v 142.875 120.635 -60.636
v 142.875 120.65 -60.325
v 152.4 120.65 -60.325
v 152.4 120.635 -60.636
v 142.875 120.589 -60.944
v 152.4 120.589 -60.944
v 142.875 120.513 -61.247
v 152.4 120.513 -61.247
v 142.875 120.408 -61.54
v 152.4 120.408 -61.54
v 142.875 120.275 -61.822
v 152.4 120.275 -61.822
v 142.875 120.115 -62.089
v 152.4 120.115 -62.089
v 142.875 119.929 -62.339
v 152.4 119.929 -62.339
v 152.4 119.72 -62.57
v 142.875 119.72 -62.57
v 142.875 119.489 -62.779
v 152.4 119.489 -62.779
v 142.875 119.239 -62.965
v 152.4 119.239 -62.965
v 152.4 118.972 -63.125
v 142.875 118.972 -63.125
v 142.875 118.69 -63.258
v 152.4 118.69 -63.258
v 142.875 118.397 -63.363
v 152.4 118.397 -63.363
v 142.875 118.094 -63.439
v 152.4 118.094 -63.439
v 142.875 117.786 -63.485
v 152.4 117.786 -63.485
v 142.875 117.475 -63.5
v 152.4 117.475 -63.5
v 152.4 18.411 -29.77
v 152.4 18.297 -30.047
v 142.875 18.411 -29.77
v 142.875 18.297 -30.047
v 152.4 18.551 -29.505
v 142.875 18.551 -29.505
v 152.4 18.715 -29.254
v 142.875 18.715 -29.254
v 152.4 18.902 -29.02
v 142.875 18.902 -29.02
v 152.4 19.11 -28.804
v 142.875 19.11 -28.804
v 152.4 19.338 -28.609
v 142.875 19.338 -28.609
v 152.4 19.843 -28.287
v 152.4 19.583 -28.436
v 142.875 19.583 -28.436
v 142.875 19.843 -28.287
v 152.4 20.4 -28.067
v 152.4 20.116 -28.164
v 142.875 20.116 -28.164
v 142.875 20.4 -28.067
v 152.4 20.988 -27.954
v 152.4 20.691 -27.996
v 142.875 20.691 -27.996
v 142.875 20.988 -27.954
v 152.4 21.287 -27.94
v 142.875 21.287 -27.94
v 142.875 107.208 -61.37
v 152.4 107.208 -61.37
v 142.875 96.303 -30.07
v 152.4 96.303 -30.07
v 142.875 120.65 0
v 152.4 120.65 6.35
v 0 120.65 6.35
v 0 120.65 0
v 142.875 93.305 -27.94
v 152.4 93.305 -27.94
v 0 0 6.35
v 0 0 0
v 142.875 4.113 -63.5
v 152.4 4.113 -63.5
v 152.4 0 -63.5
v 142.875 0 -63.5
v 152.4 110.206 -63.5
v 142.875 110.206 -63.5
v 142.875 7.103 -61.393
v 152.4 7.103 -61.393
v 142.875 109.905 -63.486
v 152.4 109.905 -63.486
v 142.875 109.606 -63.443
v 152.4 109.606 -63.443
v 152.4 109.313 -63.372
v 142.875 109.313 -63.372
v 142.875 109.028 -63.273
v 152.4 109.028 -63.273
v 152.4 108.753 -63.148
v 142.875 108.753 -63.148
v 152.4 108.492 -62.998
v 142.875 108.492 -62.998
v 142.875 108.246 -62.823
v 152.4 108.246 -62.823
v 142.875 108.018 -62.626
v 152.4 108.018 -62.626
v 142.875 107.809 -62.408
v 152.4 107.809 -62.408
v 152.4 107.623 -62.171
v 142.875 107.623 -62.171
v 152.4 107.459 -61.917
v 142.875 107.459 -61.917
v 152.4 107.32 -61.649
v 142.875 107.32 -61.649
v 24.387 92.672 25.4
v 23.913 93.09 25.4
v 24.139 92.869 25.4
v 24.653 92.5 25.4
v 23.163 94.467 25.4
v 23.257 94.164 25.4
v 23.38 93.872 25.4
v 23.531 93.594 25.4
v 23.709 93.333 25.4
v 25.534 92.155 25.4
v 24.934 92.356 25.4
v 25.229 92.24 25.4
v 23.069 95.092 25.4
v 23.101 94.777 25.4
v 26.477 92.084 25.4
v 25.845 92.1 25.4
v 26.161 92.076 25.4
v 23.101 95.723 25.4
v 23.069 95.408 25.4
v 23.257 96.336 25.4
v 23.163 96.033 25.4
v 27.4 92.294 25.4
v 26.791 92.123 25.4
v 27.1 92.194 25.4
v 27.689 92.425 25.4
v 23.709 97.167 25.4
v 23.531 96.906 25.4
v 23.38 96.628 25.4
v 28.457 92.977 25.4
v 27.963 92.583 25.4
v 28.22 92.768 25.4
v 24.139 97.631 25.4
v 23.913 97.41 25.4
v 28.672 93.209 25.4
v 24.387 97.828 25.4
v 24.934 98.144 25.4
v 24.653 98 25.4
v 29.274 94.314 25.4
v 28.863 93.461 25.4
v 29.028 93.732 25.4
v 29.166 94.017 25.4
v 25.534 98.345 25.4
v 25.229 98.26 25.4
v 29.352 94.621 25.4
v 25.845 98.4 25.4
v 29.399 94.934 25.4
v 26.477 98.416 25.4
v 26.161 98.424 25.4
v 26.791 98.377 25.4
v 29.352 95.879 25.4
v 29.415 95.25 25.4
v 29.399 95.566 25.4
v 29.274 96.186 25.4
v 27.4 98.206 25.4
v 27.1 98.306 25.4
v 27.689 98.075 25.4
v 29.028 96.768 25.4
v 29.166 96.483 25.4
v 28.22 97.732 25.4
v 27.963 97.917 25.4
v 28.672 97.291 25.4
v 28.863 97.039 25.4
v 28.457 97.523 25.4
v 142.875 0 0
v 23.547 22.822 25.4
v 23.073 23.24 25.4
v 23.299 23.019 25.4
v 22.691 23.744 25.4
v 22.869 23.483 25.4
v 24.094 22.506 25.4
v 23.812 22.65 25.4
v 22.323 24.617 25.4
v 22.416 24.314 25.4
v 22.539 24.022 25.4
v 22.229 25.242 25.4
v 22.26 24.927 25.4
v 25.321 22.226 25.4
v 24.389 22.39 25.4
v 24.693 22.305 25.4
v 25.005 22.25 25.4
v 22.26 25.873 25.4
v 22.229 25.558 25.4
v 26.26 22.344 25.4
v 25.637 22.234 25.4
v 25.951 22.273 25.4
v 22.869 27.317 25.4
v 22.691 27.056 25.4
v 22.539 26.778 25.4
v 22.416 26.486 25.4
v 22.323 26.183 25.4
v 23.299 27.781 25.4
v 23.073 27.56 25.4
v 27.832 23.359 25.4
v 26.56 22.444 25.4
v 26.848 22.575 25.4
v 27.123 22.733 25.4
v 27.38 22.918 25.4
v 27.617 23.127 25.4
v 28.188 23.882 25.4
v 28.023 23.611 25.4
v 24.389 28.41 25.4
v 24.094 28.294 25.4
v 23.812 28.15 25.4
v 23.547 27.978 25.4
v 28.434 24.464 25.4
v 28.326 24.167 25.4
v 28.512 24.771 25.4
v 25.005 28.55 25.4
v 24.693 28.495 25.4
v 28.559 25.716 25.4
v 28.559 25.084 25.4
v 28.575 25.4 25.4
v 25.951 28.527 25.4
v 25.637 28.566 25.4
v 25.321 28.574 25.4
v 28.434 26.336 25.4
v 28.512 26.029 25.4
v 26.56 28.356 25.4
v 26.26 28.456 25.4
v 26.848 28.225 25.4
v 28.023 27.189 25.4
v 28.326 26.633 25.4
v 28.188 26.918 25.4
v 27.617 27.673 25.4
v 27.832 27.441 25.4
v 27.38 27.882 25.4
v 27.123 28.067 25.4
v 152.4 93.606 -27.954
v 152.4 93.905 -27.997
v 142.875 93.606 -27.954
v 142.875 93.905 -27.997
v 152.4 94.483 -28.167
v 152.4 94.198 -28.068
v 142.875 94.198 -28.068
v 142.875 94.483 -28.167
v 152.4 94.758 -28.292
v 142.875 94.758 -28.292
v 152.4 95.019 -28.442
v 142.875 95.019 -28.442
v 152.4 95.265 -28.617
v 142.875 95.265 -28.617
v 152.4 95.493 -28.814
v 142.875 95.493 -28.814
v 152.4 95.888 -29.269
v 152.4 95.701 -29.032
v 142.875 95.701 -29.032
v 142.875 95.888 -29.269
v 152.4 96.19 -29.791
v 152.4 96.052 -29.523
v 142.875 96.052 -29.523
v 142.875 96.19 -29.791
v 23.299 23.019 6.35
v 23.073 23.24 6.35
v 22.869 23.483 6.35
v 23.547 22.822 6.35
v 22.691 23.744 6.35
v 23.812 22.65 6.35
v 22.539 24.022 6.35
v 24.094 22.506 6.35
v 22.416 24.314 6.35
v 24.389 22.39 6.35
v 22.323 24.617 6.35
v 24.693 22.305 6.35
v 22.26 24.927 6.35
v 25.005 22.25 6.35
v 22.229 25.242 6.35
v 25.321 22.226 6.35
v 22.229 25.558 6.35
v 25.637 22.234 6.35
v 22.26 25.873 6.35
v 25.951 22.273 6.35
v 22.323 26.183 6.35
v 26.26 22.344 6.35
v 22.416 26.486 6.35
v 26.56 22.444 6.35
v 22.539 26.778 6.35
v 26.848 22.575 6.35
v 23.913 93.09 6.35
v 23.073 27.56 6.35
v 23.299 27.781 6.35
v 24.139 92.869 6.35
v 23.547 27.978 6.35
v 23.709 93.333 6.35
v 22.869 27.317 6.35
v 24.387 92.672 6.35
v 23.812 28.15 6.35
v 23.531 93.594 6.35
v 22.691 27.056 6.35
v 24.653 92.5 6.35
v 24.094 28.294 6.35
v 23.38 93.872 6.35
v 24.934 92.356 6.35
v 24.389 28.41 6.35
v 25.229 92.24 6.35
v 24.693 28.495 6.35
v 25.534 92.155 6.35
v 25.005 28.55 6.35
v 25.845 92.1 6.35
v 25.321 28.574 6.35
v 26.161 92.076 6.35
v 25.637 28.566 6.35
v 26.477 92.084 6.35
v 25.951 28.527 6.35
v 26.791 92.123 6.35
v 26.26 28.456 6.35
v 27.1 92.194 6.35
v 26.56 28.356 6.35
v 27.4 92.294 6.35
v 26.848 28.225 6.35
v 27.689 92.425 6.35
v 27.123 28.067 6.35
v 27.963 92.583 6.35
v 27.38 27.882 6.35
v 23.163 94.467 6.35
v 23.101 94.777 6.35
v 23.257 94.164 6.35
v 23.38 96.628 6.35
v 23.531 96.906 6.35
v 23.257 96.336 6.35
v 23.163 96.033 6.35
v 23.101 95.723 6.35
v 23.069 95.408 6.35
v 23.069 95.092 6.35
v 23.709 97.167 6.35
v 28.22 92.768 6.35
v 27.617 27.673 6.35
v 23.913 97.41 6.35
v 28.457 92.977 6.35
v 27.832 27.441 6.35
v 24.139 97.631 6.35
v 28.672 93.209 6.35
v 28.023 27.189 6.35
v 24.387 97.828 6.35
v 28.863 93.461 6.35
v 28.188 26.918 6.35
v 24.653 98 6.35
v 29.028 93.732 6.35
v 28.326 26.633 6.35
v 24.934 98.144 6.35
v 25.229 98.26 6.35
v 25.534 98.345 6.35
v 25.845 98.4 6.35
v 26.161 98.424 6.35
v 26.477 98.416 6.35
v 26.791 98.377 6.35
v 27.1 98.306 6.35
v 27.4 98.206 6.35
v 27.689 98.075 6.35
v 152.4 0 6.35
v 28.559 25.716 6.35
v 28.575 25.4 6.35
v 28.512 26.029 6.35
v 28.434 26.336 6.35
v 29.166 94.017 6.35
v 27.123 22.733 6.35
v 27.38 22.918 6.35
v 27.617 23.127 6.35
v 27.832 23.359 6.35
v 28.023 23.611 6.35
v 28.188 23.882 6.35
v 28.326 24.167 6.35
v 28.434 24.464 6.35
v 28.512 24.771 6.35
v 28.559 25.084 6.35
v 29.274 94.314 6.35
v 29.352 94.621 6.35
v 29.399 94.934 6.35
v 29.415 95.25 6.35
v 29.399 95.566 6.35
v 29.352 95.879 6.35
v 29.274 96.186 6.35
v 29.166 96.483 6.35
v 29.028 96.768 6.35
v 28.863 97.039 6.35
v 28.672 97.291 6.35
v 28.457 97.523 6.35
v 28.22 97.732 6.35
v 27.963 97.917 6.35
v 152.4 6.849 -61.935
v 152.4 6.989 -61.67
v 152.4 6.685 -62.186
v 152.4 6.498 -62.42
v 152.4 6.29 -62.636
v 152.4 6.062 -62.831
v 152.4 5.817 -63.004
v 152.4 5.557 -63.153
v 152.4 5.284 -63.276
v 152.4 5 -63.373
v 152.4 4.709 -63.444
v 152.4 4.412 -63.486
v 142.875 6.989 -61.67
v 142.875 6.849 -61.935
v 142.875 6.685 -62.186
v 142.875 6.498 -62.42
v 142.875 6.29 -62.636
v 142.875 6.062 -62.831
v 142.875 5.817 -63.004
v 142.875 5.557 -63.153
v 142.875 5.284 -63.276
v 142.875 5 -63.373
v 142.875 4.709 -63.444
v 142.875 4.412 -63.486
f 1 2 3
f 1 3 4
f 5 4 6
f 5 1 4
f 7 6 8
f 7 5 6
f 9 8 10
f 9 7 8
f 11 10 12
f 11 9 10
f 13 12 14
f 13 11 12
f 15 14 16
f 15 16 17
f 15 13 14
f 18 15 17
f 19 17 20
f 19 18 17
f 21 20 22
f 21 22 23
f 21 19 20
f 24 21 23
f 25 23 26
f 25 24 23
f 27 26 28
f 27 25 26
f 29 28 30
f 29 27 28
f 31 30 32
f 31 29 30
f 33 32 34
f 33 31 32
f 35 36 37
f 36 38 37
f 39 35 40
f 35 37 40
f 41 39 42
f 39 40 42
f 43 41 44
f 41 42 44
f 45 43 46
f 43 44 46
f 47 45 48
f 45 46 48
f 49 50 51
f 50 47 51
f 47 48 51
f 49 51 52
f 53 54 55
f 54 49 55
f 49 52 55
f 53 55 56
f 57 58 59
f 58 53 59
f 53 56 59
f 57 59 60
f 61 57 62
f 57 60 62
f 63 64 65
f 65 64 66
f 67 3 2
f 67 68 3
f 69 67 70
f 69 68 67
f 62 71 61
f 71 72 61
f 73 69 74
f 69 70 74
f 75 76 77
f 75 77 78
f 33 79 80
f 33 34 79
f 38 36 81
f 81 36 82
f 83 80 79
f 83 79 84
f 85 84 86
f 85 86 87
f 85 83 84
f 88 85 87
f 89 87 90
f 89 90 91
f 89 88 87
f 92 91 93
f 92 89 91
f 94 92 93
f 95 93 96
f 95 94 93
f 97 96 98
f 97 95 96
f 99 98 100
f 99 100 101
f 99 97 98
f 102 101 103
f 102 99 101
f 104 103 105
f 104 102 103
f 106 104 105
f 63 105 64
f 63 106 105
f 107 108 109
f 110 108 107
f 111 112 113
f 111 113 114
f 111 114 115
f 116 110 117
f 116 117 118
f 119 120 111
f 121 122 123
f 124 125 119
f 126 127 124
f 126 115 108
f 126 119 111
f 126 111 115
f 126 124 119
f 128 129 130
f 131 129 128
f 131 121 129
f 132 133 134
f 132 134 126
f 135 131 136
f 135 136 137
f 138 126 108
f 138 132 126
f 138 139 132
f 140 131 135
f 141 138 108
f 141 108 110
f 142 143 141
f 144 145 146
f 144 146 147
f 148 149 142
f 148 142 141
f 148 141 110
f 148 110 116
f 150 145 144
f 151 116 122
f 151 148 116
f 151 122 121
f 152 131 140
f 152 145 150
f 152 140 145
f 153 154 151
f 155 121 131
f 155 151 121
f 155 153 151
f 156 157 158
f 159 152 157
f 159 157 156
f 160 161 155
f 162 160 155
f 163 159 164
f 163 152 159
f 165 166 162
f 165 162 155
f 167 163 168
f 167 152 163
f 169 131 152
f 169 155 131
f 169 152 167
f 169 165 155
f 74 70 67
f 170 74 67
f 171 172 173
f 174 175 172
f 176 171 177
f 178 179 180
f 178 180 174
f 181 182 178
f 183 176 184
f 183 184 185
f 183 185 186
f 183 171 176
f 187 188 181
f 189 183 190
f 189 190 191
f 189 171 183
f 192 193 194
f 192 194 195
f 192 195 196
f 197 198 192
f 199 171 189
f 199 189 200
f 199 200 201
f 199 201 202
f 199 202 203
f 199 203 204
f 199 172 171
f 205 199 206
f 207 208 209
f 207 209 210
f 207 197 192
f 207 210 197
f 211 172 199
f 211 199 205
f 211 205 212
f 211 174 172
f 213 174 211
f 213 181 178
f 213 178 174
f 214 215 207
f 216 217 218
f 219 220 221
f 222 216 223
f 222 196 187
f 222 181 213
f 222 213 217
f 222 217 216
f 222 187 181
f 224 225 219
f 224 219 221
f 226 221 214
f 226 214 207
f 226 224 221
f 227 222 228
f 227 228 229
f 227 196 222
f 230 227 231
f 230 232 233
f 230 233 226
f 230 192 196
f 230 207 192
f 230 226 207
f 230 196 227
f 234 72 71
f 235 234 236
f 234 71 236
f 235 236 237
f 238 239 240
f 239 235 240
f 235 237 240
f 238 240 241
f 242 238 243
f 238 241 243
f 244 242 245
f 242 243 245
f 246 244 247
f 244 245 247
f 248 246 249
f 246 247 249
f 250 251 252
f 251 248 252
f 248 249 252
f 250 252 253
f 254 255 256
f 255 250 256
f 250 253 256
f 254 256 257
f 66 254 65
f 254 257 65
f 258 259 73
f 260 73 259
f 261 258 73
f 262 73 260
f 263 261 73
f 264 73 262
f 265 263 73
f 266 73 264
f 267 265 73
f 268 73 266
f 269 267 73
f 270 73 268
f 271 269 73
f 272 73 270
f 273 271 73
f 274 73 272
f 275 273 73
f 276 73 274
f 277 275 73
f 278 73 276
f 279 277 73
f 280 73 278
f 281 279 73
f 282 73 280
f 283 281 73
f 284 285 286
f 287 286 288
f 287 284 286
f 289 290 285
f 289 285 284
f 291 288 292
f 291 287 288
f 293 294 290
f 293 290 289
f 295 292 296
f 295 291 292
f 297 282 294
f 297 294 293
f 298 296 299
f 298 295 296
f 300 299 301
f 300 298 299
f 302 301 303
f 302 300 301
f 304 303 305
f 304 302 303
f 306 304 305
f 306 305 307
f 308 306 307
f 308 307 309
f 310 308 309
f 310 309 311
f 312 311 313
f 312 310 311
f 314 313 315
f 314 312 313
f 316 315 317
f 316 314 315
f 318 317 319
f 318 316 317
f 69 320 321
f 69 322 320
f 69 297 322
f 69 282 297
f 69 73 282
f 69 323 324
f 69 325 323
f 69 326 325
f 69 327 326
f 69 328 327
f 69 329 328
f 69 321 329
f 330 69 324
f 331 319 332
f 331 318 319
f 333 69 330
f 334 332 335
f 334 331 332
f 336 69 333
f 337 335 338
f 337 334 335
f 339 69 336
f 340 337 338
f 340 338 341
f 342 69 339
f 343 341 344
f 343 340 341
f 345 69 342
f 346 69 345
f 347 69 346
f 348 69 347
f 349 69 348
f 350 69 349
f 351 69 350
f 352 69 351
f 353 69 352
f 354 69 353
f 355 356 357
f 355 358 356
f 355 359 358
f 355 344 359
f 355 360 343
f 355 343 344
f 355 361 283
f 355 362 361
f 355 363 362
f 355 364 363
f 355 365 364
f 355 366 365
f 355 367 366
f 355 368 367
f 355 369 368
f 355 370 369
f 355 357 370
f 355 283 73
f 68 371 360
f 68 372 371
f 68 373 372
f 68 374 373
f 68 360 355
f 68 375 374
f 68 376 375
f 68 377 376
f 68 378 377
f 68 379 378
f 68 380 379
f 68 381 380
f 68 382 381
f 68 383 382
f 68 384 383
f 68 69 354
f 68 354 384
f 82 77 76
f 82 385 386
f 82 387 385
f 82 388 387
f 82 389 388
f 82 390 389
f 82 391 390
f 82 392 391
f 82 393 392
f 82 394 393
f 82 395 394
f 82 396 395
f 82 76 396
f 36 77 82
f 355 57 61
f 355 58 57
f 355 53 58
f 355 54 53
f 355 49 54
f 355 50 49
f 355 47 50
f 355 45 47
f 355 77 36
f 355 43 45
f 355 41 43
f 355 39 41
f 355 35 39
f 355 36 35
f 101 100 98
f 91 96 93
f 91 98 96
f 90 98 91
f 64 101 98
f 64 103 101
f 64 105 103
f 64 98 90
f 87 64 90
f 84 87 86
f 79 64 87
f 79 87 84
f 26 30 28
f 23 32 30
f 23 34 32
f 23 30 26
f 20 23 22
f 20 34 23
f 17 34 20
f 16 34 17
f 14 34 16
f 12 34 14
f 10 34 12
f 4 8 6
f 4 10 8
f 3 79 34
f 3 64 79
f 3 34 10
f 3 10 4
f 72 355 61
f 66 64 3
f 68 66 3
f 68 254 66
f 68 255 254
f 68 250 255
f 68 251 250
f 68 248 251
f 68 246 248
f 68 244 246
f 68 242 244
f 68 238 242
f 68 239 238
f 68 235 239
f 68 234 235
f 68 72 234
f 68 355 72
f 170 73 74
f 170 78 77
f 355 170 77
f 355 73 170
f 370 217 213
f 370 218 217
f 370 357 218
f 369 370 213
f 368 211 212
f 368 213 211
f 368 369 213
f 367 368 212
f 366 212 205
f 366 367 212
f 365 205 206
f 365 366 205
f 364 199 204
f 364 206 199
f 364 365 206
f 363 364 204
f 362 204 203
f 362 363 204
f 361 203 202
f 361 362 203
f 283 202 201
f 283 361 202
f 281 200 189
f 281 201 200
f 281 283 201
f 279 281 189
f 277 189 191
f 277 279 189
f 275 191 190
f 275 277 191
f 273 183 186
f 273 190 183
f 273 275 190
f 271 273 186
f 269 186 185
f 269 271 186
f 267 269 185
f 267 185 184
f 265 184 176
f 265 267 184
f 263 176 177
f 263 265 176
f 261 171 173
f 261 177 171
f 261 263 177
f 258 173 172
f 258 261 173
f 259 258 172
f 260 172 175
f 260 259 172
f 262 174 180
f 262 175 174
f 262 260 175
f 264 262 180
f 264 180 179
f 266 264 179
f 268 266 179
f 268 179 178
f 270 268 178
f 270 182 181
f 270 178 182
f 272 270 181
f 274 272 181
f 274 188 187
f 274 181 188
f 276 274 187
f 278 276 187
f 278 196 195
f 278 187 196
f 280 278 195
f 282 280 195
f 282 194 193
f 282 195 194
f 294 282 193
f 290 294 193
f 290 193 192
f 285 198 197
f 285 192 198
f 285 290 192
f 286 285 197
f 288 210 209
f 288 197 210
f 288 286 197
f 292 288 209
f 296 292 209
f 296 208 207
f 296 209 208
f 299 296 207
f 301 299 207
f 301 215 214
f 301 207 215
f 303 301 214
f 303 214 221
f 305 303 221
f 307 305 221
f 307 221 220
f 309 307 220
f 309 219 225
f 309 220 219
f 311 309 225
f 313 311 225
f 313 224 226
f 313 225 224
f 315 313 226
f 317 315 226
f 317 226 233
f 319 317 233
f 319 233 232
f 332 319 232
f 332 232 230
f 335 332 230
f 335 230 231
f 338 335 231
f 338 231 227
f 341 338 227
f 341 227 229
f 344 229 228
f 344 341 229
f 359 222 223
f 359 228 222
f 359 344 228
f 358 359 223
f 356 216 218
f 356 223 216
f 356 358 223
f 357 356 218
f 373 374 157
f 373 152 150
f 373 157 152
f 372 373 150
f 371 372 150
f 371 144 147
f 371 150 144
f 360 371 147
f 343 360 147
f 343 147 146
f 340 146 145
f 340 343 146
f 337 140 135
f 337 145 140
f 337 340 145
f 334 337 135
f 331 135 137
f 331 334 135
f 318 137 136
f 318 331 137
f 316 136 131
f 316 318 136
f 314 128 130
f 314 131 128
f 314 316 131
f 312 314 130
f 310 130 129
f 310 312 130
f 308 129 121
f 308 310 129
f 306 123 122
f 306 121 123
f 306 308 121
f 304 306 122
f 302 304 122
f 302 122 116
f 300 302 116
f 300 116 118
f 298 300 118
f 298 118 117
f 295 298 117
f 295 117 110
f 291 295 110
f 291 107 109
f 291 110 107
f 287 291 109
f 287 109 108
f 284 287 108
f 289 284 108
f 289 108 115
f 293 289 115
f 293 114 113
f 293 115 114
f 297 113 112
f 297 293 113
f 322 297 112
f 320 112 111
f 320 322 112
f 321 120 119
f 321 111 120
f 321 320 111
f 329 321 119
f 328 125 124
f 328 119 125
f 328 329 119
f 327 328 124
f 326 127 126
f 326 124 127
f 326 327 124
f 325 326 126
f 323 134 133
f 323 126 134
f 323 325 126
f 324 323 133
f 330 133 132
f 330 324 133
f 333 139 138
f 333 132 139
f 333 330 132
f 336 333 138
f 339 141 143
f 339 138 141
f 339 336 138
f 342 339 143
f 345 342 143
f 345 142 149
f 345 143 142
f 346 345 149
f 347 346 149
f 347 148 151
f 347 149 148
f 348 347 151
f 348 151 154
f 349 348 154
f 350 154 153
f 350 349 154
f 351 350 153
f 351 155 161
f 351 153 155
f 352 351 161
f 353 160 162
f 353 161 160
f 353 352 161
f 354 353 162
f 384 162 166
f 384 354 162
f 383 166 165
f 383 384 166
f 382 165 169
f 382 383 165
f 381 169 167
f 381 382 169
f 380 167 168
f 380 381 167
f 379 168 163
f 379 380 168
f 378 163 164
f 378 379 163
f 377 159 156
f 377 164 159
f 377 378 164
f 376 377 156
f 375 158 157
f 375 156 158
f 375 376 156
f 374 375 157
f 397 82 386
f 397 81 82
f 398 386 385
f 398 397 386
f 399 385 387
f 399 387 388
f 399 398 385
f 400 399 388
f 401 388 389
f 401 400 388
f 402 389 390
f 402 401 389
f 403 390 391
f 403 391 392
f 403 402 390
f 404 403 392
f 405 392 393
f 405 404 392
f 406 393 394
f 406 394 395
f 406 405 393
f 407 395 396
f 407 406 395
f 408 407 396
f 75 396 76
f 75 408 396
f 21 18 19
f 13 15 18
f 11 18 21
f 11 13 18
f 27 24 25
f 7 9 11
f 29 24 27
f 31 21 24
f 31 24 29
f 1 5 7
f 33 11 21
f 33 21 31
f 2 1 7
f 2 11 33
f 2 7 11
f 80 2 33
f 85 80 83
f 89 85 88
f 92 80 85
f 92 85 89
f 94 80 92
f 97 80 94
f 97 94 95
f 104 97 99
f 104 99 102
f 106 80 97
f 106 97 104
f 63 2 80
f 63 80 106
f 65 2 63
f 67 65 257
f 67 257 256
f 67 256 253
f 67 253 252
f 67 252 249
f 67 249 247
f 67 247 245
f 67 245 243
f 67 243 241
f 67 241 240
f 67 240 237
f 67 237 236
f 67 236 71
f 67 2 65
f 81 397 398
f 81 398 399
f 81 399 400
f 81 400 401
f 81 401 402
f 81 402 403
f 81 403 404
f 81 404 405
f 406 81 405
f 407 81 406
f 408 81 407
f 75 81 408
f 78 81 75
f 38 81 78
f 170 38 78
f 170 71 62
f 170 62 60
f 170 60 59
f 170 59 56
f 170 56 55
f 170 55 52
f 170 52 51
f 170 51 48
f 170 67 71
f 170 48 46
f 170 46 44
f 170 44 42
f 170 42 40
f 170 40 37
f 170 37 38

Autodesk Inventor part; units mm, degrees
ref_plane "YZ Plane" through (0, 0, 0) normal (1, 0, 0) x (0, 1, 0)
ref_plane "XZ Plane" through (0, 0, 0) normal (0, 1, 0) x (-1, 0, 0)
ref_plane "XY Plane" through (0, 0, 0) normal (0, 0, 1) x (1, 0, 0)
sketch "Sketch1" plane through (0, 0, 0) normal (0, 0, 1) x (1, 0, 0)
  line L0 (0, 0) -> (152.4, 0)
  line L1 (152.4, 0) -> (152.4, 120.65)
  line L2 (152.4, 120.65) -> (0, 120.65)
  line L3 (0, 120.65) -> (0, 0)
  dimension "d0" = 152.4
  dimension "d1" = 120.65
extrude "Extrusion1" add sketch "Sketch1" along normal blind 6.35
sketch "Sketch2" plane through (0, 0, 6.35) normal (0, 0, 1) x (1, 0, 0)
  line L0 (0, 0) -> (152.4, 0) projected
  line L1 (152.4, 120.65) -> (0, 120.65) projected
  line L2 (114.2866, 59.261) -> (0, 60.6355)
  line L3 (0, 120.65) -> (0, 0) projected
  line L4 (76.2, 0) -> (76.2, 120.65)
  circle A0 centre (25.4, 25.4) radius 3.175
  circle A1 centre (26.2401, 95.25) radius 3.175
  point P0 (114.7072, 94.0562)
  dimension "d18" = 25.4
  dimension "d20" = 25.4
  dimension "d23" = 25.4
  dimension "d24" = 26.2401
  dimension "d31" = 69.85
  dimension "d32" = 6.35
sketch "Sketch3" plane through (0, 0, 6.35) normal (0, 0, 1) x (1, 0, 0)
  point P0 (0, 0)
extrude "Extrusion4" add sketch "Sketch2" along normal blind 19.05 contours A0 | A1
thread "Thread5" size "3/8-16 UNC" class "2A" standard "ANSI Unified Screw Threads" full length
thread "Thread6" size "3/8-16 UNC" class "2A" standard "ANSI Unified Screw Threads" full length
sketch "Sketch7" plane through (0, 0, 0) normal (0, 0, -1) x (-1, 0, 0)
  line L0 (-152.4, 0) -> (-152.4, 120.65) projected
  line L1 (0, 0) -> (-152.4, 0) projected
  line L2 (-152.4, 120.65) -> (-142.875, 120.65)
  line L3 (-142.875, 120.65) -> (-142.875, 0)
  line L4 (-142.875, 0) -> (-152.4, 0)
  line L5 (-152.4, 0) -> (-152.4, 120.65)
  dimension "d36" = 9.525
extrude "Extrusion6" add sketch "Sketch7" along normal blind 63.5
sketch "Sketch8" plane through (152.4, 0, 6.35) normal (1, 0, 0) x (0, 0, -1)
  line L0 (69.85, 0) -> (69.85, 120.65) projected
  line L1 (0, 0) -> (0, 120.65) projected
  line L2 (69.85, 107.95) -> (34.29, 95.5609)
  line L3 (34.29, 95.5609) -> (34.29, 19.05)
  line L4 (34.29, 19.05) -> (69.85, 6.35)
  point P0 (6.35, 0)
  point P1 (34.29, 108.2609)
  point P2 (34.29, 6.35)
  dimension "d39" = 12.7
  dimension "d40" = 12.7
  dimension "d41" = 34.29
  dimension "d42" = 34.29
  dimension "d43" = 34.29
  dimension "d44" = 34.29
extrude "Extrusion7" cut sketch "Sketch8" against normal blind 63.5
fillet "Fillet1" radius 3.175 5 edges at (147.6375, 120.65, -63.5) (147.6375, 107.95, -63.5) (147.6375, 95.5609, -27.94) (147.6375, 19.05, -27.94) (147.6375, 6.35, -63.5)
properties part number "LucasCharles Part 10 final" material "Stainless Steel, Austenitic"
